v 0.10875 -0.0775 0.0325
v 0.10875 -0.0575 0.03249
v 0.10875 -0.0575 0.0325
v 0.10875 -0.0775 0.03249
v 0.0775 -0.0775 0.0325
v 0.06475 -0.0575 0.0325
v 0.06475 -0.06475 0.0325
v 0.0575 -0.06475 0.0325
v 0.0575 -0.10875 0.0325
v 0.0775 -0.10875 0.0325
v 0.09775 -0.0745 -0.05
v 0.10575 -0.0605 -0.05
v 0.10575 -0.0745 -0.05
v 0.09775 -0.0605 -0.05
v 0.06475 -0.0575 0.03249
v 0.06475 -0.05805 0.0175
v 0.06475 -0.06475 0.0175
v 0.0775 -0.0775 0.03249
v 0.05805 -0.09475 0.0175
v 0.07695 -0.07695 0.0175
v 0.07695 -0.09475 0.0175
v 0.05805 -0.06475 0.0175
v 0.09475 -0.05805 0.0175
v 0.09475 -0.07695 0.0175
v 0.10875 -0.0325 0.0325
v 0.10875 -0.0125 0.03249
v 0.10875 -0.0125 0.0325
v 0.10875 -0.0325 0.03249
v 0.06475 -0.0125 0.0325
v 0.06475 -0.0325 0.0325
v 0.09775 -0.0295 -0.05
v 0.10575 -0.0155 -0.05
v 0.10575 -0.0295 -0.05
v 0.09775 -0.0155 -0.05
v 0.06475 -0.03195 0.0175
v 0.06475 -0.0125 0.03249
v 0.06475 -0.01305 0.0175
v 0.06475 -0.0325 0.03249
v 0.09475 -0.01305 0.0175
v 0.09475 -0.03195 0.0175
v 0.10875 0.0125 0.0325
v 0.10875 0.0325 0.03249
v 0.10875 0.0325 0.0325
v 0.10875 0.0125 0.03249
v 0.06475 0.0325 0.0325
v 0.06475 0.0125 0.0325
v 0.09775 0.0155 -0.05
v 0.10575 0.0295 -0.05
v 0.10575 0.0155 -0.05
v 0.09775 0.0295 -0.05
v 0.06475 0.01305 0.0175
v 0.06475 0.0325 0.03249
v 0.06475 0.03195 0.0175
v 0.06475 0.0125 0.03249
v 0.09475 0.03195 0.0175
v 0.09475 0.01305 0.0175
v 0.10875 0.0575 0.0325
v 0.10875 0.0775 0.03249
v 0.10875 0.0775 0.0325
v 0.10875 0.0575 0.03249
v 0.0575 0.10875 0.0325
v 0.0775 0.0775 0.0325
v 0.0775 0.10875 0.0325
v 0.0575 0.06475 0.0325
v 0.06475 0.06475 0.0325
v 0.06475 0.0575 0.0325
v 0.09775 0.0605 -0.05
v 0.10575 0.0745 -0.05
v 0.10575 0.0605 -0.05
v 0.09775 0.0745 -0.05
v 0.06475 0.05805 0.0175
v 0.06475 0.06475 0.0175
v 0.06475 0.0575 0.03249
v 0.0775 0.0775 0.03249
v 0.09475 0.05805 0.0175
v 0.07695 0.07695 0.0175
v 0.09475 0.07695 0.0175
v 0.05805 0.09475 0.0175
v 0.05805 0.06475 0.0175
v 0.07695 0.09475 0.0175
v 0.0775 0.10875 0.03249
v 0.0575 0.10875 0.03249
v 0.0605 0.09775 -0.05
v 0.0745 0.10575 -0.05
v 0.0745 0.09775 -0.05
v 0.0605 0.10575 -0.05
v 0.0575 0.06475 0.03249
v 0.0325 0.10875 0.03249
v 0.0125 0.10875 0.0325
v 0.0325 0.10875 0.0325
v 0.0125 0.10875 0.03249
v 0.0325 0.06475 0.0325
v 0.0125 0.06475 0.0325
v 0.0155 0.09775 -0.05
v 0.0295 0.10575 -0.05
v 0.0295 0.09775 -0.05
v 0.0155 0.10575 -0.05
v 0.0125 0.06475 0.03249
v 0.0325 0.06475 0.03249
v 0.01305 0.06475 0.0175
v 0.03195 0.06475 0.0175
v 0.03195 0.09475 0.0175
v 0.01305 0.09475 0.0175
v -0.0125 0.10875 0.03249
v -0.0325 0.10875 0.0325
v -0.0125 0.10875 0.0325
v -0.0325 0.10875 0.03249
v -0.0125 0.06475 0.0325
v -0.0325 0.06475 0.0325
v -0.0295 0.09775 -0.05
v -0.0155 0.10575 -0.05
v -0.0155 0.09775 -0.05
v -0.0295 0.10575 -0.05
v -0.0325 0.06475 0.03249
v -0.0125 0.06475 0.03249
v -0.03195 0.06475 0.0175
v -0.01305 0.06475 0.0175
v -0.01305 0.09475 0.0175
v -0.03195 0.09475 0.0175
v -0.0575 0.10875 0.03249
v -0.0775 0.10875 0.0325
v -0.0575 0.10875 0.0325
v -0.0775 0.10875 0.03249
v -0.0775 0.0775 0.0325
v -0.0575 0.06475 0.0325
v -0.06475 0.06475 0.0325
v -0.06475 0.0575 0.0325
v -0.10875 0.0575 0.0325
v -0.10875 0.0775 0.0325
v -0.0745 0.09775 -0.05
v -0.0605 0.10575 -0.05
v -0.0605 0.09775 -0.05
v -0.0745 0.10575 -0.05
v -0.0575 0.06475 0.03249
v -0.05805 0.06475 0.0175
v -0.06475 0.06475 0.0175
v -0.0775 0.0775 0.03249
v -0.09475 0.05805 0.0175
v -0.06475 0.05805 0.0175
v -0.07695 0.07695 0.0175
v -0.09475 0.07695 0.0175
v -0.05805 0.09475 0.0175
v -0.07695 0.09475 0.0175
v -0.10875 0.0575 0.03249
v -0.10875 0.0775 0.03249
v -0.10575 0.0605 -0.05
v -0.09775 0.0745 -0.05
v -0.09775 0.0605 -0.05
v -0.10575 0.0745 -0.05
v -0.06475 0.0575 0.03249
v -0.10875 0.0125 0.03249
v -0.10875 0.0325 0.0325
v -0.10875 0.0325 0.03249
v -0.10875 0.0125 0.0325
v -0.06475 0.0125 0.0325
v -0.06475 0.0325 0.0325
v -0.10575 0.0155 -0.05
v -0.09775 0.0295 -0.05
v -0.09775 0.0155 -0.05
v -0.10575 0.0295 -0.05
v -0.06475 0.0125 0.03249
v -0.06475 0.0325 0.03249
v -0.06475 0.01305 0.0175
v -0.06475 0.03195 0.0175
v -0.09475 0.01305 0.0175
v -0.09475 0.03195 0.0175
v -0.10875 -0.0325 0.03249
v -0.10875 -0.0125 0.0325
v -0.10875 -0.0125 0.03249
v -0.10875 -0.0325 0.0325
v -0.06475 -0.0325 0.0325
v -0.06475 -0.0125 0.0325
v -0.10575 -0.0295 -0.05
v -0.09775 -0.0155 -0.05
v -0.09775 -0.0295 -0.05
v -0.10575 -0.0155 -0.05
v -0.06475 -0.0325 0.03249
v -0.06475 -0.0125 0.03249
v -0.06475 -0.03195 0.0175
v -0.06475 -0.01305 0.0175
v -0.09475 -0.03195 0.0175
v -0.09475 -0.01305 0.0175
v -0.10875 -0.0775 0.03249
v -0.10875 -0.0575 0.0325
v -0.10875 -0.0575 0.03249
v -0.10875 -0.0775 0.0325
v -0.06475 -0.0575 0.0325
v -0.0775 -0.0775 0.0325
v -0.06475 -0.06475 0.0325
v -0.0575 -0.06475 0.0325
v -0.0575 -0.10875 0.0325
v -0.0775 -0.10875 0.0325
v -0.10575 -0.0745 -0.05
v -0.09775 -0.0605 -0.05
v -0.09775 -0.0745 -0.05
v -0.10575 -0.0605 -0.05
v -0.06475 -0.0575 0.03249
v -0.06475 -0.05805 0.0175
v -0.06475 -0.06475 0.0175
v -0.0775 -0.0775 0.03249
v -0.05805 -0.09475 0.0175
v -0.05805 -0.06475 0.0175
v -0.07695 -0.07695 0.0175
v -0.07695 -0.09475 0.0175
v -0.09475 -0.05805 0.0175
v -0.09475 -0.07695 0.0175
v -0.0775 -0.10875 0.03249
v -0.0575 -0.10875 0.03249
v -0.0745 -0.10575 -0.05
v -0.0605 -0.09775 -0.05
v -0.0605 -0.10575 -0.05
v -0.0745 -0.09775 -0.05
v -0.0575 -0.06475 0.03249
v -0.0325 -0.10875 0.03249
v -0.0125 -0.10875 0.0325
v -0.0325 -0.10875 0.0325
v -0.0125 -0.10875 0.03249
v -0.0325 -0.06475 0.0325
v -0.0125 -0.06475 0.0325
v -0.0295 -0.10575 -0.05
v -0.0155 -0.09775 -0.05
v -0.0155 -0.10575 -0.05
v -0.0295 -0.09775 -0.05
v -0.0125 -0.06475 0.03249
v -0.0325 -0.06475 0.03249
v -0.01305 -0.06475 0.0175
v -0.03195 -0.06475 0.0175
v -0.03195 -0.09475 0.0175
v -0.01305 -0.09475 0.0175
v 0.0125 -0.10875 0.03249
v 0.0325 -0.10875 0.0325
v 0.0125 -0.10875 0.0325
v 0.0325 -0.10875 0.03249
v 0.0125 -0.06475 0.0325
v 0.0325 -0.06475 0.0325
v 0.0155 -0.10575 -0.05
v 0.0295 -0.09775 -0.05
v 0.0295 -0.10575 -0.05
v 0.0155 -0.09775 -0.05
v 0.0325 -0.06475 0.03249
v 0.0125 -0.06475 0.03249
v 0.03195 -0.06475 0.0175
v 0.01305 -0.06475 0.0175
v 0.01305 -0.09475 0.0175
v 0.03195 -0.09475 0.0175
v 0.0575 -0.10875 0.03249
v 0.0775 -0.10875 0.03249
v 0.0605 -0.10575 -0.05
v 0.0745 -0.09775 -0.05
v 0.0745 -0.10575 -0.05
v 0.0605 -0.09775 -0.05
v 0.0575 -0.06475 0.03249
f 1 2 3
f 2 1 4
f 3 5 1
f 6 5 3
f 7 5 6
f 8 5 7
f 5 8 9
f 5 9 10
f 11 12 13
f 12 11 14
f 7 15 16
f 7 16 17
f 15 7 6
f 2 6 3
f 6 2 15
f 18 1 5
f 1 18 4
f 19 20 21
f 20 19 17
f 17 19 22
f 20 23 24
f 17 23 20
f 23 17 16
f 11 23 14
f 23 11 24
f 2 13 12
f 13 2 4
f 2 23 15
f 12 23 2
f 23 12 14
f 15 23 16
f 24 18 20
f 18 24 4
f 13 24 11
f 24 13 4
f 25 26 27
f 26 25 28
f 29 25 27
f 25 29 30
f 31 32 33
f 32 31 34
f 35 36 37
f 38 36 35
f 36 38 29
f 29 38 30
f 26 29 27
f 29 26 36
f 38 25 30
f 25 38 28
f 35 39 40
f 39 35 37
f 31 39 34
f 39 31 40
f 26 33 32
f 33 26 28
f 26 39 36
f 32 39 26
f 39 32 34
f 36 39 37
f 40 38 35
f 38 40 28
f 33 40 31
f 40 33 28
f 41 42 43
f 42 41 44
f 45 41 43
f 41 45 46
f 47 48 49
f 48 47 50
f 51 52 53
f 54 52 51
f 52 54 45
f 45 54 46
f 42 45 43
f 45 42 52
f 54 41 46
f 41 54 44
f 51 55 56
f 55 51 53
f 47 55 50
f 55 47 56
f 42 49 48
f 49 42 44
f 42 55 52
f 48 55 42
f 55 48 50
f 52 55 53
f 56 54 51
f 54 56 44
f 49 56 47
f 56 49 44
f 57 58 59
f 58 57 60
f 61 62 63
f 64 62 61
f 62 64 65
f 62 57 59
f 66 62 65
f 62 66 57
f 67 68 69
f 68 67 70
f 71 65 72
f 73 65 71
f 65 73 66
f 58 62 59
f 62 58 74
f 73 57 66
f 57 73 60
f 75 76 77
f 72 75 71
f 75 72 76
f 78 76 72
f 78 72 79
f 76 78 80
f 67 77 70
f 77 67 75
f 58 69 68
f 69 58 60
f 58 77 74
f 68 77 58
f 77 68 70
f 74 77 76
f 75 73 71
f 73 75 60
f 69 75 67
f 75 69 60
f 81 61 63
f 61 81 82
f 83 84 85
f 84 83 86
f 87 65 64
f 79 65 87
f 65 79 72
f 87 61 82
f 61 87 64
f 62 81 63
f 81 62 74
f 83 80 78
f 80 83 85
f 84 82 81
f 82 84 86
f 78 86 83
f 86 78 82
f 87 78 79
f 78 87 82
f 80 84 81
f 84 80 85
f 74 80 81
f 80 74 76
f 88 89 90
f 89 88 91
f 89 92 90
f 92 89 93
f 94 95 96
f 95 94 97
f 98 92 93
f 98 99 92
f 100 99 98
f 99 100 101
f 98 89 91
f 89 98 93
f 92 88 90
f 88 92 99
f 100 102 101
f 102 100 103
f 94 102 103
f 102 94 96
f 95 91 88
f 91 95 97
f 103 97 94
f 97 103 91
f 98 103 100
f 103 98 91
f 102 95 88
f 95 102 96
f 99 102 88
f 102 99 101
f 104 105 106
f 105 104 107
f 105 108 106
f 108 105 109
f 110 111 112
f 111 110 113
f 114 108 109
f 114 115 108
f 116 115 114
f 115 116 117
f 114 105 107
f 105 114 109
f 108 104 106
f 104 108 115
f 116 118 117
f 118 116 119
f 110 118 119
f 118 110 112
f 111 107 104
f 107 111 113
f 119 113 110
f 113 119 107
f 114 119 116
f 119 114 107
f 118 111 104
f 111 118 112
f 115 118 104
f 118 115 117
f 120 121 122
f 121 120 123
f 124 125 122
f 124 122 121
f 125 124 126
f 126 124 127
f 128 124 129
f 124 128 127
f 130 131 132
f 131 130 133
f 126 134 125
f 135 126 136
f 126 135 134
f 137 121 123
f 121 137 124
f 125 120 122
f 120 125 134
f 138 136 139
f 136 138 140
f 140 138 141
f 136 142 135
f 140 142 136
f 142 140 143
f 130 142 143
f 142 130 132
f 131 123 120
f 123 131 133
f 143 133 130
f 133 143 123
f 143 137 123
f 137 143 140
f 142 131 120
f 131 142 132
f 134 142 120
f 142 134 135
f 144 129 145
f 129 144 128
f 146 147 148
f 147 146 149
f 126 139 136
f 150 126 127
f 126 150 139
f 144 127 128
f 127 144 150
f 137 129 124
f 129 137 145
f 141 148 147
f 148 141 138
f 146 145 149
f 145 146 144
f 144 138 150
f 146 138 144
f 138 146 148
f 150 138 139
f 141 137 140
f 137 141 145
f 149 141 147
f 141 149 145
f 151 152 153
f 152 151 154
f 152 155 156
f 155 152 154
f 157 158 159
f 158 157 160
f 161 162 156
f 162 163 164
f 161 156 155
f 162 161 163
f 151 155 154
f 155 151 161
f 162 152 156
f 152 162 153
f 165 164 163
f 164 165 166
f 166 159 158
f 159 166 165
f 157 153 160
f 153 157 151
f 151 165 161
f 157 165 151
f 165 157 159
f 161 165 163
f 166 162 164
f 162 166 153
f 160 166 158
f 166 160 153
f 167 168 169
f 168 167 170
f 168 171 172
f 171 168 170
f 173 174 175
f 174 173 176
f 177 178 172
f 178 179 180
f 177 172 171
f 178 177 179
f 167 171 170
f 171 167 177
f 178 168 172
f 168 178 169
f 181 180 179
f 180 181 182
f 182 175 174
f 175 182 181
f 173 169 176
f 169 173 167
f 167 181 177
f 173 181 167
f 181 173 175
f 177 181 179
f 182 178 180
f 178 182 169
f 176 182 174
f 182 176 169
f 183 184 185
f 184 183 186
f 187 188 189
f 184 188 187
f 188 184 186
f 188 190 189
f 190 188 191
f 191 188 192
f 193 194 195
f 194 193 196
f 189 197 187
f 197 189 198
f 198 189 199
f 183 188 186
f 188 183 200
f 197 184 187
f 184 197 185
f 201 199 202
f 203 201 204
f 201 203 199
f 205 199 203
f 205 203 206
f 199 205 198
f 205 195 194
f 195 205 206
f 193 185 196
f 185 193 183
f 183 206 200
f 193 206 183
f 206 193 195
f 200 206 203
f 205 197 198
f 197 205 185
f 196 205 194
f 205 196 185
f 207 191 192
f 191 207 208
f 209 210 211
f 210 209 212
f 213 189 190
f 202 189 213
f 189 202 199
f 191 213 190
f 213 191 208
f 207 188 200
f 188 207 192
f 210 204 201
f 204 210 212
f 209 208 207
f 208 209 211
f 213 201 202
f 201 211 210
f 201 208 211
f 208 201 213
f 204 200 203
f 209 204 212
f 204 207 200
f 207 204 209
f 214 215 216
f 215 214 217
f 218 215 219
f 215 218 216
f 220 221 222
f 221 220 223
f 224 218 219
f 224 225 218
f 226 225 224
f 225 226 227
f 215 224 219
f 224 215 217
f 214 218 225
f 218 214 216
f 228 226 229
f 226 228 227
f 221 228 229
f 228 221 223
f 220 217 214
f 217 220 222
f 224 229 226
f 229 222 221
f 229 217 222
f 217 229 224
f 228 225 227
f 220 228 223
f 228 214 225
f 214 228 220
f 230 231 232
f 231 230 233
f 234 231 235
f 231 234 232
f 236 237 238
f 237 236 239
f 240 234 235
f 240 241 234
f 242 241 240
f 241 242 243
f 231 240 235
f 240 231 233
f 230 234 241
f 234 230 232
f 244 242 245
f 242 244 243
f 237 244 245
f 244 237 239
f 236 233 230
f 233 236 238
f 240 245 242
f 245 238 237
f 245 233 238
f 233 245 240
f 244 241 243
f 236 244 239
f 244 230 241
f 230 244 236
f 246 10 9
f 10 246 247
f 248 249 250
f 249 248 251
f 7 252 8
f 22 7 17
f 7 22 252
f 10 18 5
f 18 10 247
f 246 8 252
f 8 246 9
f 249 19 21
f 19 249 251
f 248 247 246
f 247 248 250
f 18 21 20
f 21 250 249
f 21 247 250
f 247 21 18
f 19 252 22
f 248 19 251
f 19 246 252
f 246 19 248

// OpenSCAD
// file: FPGAHousing_base.scad
include <FPGA_shared.scad>;
use <FPGAHousing_paintcap.scad>;
use <PowerSymbol.scad>;
use <DataSymbol.scad>;

module FPGAHousing_chipcutout() {
  slotPinBaseOffset = (-slotPinEdgeCount-1)/2 * slotPinEdgeSpacing;
  slotPinEdgeOffset = slotSize/2 - slotPinSize/2 - slotPinEdgePad;
  union() {
    translate([0, 0, baseDepth/2 + slotBottom + slotPinDepth]) {
      cube(size=[slotSize, slotSize, baseDepth], center=true);
    }
    for(edge=[1:4]) rotate([0,0,90*edge]) {
      for(i=[1:slotPinEdgeCount]) {
        translate([
          slotPinBaseOffset + slotPinEdgeSpacing*i,
          slotPinEdgeOffset,
          slotBottom + slotPinDepth
        ]) {
          cube(size=[slotPinSize, slotPinSize, slotPinDepth*2], center=true);
        }
      }
    }
    translate([alignHoleOffset,alignHoleOffset,slotBottom + slotPinDepth])
      cylinder(h=alignHoleDepth*2, r=alignHoleRadius, center=true, $fn=alignHoleSides);
  }
}

module FPGAHousing_base() {
  middleSize = (slotSize + capSize) / 2;
  difference() {
    union() {
      translate([0,0,baseCenter])
        cube(size=[baseSize, baseSize, baseDepth], center=true);
      translate([0,0,baseTop-eps])
        cube(size=[middleSize, middleSize, capDepth*2], center=true);
    }
    translate([0,0,baseBottom])
      cube(size=[baseBackCutoutSize, baseBackCutoutSize, baseBackCutoutDepth*2], center=true);
    FPGAHousing_chipcutout();
  }
}

FPGAHousing_base();
%FPGAHousing_paintcap();
// file: Text_shared.scad
char_depth = 0.0001;

char_pixelsz = 0.02/5;
char_pheight = 5;
char_max_pwidth = 5;

function sum(list) = list * [for (_=list) 1];
function partialsum(list, end) = list * [for (i=[0:len(list)-1]) i < end ? 1 : 0];

module _Text_Line(a, b) {
  l = norm(b-a);
  f = l > 0 ? (b-a)/l : [1, 0];
  r = [f.y, -f.x];
  ea = -0.5*f;
  eb = (l+0.5)*f;
  sr = 0.5*r;
  sl = -sr;
  polygon([
    a+ea+sr,
    a+eb+sr,
    a+eb+sl,
    a+ea+sl,
  ]*char_pixelsz);
}

module _Text_Segments(pts, off=[0,0]) {
  for (i=[0:len(pts)-2]) {
    pa = pts[i];
    pb = pts[i+1];
    if (len(pa) == 2 && len(pb) == 2)
      _Text_Line(pts[i]+off, pts[i+1]+off);
  }
}

_Letters = [
  [[-2, -2], [-2, 2], [2, 2], [2, -2], [2, 0], [-2, 0]], // A
  [], // B
  [[2, -2], [-2, -2], [-2, 2], [2, 2]], // C
  [[2, 0.5], [2, -2], [-2, -2], [-2, 2], [0.5, 2], [], [3, 0], [0, 3]], // D
  [[2, -2], [-2, -2], [-2, 2], [2, 2], [], [-2, 0], [0, 0]], // E
  [[2, 2], [-2, 2], [-2, -2], [-2, 0], [0, 0]], // F
  [[0, 0], [2, 0], [2, -2], [-2, -2], [-2, 2], [2, 2]], // G
  [], // H
  [[0, -2], [0, 2]], // I
  [], // J
  [], // K
  [[-2, 2], [-2, -2], [2, -2]], // L
  [], // M
  [], // N
  [[-2, -2], [-2, 2], [2, 2], [2, -2], [-2, -2]], // O
  [[-2, -2], [-2, 2], [2, 2], [2, 0], [-2, 0]], // P
  [], // Q
  [[-2, -2], [-2, 2], [2, 2], [2, 0], [-2, 0], [1, -3]], // R
  [], // S
  [], // T
  [], // U
  [], // V
  [], // W
  [], // X
  [], // Y
  [], // Z
  [[-2, 2], [2, 2], [2, 0], [0, 0], [], [0, -2], [0, -2]], // ? for missing
];

function _Letter_Lookup(c) =
  let(
    ci=ord(c),
    li=ci-ord("A"),
    issp=ci==32,
    lps=li>=0&&li<26 ? _Letters[li] : [],
    lpf=len(lps)==0 ? _Letters[26] : lps
  ) issp ? [] : lpf;

function _Letter_Bounds(letter) =
  let(
    fletter = concat([[0, 0]], [for (l=letter) len(l)==2 ? l : [0,0]]),
    xs = [for (l=fletter) l.x],
    ys = [for (l=fletter) l.y]
  ) [min(xs), min(ys), max(xs), max(ys)];

module Text(letters) {
  lbounds = [for (l=letters) _Letter_Bounds(l)];
  lwidths = [for (b=lbounds) min(b.z-b.x+1, char_max_pwidth)];
  lmins = [for (b=lbounds) b.x];
  twid = sum(lwidths) + len(letters)-1;
  startoff = (1-twid)/2;
  offs = [for (i=[0:len(letters)-1]) startoff+i+partialsum(lwidths, i)];
  linear_extrude(height=char_depth) {
    for (i=[0:len(letters)-1]) if (len(letters[i]) > 0) {
      letter = letters[i];
      off = offs[i];
      left = off-lmins[i];
      wid = lwidths[i];
      intersection() {
        _Text_Segments(letter, [left, 0]);
        scale([char_pixelsz,char_pixelsz]) translate([off-0.5, -char_pheight/2])
          square(size=[wid, char_pheight]);
      }
    }
  }
}

module Text(text) {
  letters = [for (c=text) _Letter_Lookup(c)];
  lbounds = [for (l=letters) _Letter_Bounds(l)];
  lwidths = [for (b=lbounds) min(b.z-b.x+1, char_max_pwidth)];
  lmins = [for (b=lbounds) b.x];
  twid = sum(lwidths) + len(letters)-1;
  startoff = (1-twid)/2;
  offs = [for (i=[0:len(letters)-1]) startoff+i+partialsum(lwidths, i)];
  linear_extrude(height=char_depth) {
    for (i=[0:len(letters)-1]) if (len(letters[i]) > 0) {
      letter = letters[i];
      off = offs[i];
      left = off-lmins[i];
      wid = lwidths[i];
      intersection() {
        _Text_Segments(letter, [left, 0]);
        scale([char_pixelsz,char_pixelsz]) translate([off-0.5, -char_pheight/2])
          square(size=[wid, char_pheight]);
      }
    }
  }
}
// file: Text_FPGALOGIC.scad
include <Text_shared.scad>;

module Text_FPGALOGIC() {
  Text("FPGA LOGIC");
}

Text_FPGALOGIC();
// file: DataSymbol.scad
boxSize = 0.029;
lineSize = 0.0045;
symDepth = 0.01;
vertSeparation = 0.019;
horizSeparation = 0.018;

module DataSymbol() {
  boxVertCenter = (boxSize+vertSeparation)/2;
  boxHorizCenter = (boxSize+horizSeparation)/2;
  linear_extrude(symDepth, center=true) {
    translate([0,boxVertCenter]) square(boxSize, center=true); // top box
    translate([-boxHorizCenter,-boxVertCenter]) square(boxSize, center=true); // bottom left box
    translate([boxHorizCenter,-boxVertCenter]) square(boxSize, center=true); // bottom right box
    square([2*boxHorizCenter + lineSize, lineSize], center=true); // middle line
    translate([0, horizSeparation/4]) square([lineSize, horizSeparation/2 + lineSize], center=true); // line to top
    translate([-boxHorizCenter, -horizSeparation/4]) square([lineSize, horizSeparation/2 + lineSize], center=true); // line to bottom left
    translate([boxHorizCenter, -horizSeparation/4]) square([lineSize, horizSeparation/2 + lineSize], center=true); // line to bottom right
  }
}

DataSymbol();
// file: PowerSymbol.scad
symWidth = 0.038;
symHeight = 0.086;
symDepth = 0.01;
middleHeight = 0.0075;
topHorizOffset = 0.007;
sideVertOffset = 0.007;

module PowerSymbol() {
  linear_extrude(symDepth, center=true) {
    halfHei = symHeight/2;
    halfWid = symWidth/2;
    halfMid = middleHeight/2;
    polygon([
      [topHorizOffset, halfHei],
      [0, halfMid],
      [halfWid, sideVertOffset],
      [-topHorizOffset, -halfHei],
      [0, -halfMid],
      [-halfWid, -sideVertOffset]
    ]);
  }
}

PowerSymbol();
// file: FPGAHousing_pins.scad
include <FPGA_shared.scad>;
use <FPGAHousing_base.scad>;
use <FPGAHousing_paintcap.scad>;

module FPGAHousing_pins() {
  pinStartOffset = -(decoPinCount+1)/2 * decoPinSpacing;
  bevelSize = decoPinBevelSize * sqrt(2);

  for (edge=[0:3]) rotate([0,0,90*edge]) {
    for (pin=[1:decoPinCount]) translate([capSize/2, pinStartOffset+pin*decoPinSpacing, baseTop]) {
      difference() {
        cube(size=[decoPinLength*2, decoPinWidth, decoPinHeight*2], center=true);
        translate([decoPinLength,0,decoPinHeight]) rotate([0,45,0]) {
          cube(size=[bevelSize,decoPinWidth*2,bevelSize],center=true);
        }
      }
    }
  }
}

FPGAHousing_pins();
%FPGAHousing_base();
%FPGAHousing_paintcap();
// file: FPGAHousing_paintcap.scad
include <FPGA_shared.scad>;
use <FPGAHousing_base.scad>;

module FPGAHousing_paintcap() {
  bevelDepth = capBevel * sqrt(2);
  difference() {
    translate([0,0,baseTop]) {
      cube(size=[capSize, capSize, capDepth*2], center=true);
    }
    cube(size=[slotSize+eps*10, slotSize+eps*10, smallGridSize], center=true);
    for (edge=[1:4]) rotate([0,0,90*edge]) {
      translate([0,capSize/2,baseTop+capDepth]) rotate([45,0,0])
        cube(size=[capSize+0.1, bevelDepth, bevelDepth*2], center=true);
    }
  }
}

%FPGAHousing_base();
FPGAHousing_paintcap();
// file: FPGAHousing_logicbase.scad
include <FPGA_shared.scad>;
use <FPGAHousing_base.scad>;
use <FPGAHousing_paintcap.scad>;
use <PowerSymbol.scad>;
use <DataSymbol.scad>;

module FPGAHousing_logicbase() {
  difference() {
    FPGAHousing_base();
    cablecutout();
    rotate([0,0,180]) cablecutout();
  }
}

FPGAHousing_logicbase();
%FPGAHousing_paintcap();
%translate([0.067,0.25,-0.001]) rotate([-90, 0, 0]) PowerSymbol();
%translate([0.073,-0.25,0.001]) rotate([90, 0, 0]) DataSymbol();
// file: Text_FPGA.scad
include <Text_shared.scad>;

module Text_FPGA() {
  Text("FPGA");
}

Text_FPGA();
// file: FPGAHousing_logicfull.scad
use <FPGAHousing_logicbase.scad>;
use <FPGAHousing_paintcap.scad>;
use <FPGAHousing_pins.scad>;
use <PowerSymbol.scad>;
use <DataSymbol.scad>;
use <Text_FPGALOGIC.scad>;

module FPGAHousing_logicfull() {
  color("#444") FPGAHousing_logicbase();
  color("#444") FPGAHousing_paintcap();
  color("#FFF") FPGAHousing_pins();
  color("#F00") translate([0.067,0.25,-0.001]) rotate([-90, 0, 0]) PowerSymbol();
  color("#0F0") translate([0.073,-0.25,0.001]) rotate([90, 0, 0]) DataSymbol();
  color("#FFF") translate([0,0.16,0.095]) Text_FPGALOGIC();
}

FPGAHousing_logicfull();
// file: FPGAChip_base.scad
include <FPGA_shared.scad>;
use <FPGAHousing_logicfull.scad>;
use <FPGAChip_pins.scad>;
use <Text_FPGA.scad>;

module FPGAChip_base() {
  bevelHeight = (chipBaseHeight - pinHorizHeight)/2;
  bevelAngle = atan2(chipBaseBevelSize, bevelHeight);
  translate([0, 0, chipTotalHeight/2 - chipBaseHeight/2]) difference() {
    cube(size=[chipBaseSize, chipBaseSize, chipBaseHeight], center=true);
    for (side=[0:3]) rotate([0,0,90*side])
      for (vside = [-1:2:1])
        translate([0,chipBaseSize/2,vside*pinHorizHeight/2])
          rotate([vside*bevelAngle,0,0])
          translate([0,chipBaseBevelSize,0])
            cube(size=[chipBaseSize*2,chipBaseBevelSize*2,bevelHeight*4], center=true);
    translate([alignHoleOffset,alignHoleOffset,chipBaseHeight/2])
      cylinder(h=alignHoleDepth*2, r=alignHoleRadius, center=true, $fn=alignHoleSides);
  }
}

FPGAChip_base();
%FPGAChip_pins();
%translate([0,0,0.05]) Text_FPGA();
*%translate([0,0,-slotBottom-chipTotalHeight/2]) FPGAHousing_logicfull();
// file: FPGA_shared.scad
smallGridSize = 0.5;
baseSize = smallGridSize;
baseTop = 0.05;
baseBottom = -0.045;
baseDepth = baseTop - baseBottom;
baseCenter = (baseTop + baseBottom)/2;
baseBackRim = 0.02;
baseBackCutoutSize = baseSize - baseBackRim*2;
baseBackCutoutDepth = 0.01;
capSize = 0.41;
capDepth = 0.045;
capBevel = 0.01;
slotSize = smallGridSize * 0.5;
slotBottom = 0.03;
slotPinEdgeCount = 4;
slotPinEdgePad = 0.01;
slotPinEdgeSpacing = 0.045;
slotPinSize = 0.025;
slotPinDepth = 0.025;
eps = 0.00001;
chipTotalSize = slotSize - slotPinEdgePad*2 - slotPinSize/2;
chipTotalHeight = 0.1;
chipBaseHeight = 0.05;
pinHorizLength = 0.022;
pinHorizUnderLength = 0.008;
pinHorizWidth = 0.02;
pinHorizHeight = 0.015;
pinVertInnerOffset = 0.003;
pinVertOuterOffset = 0.003;
pinVertNarrowOffset = 0.003;
pinTotalHeight = chipTotalHeight - chipBaseHeight/2 + pinHorizHeight/2;
chipBaseSize = chipTotalSize - pinHorizLength*2;
chipBaseBevelSize = 0.005;
alignHoleRadius = 0.005;
alignHoleOffset = chipBaseSize/2 - 0.02;
alignHoleDepth = 0.005;
alignHoleSides = 8;
decoPinCount = 8;
decoPinWidth = 0.036;
decoPinLength = 0.034;
decoPinHeight = 0.028;
decoPinSpacing = 0.049;
decoPinBevelSize = 0.010;

module cablecutout() {
  cableradius = 0.025;
  cableDepth = 0.0125;
  translate([0,smallGridSize/2,0]) rotate([90,0,0]) {
    cylinder(h=cableDepth*2, r=cableradius, center=true, $fn=8);
  }
}
// main file
include <FPGA_shared.scad>;
use <FPGAChip_base.scad>;

module FPGAPin() {
  pinTop = chipTotalHeight/2 - chipBaseHeight/2 + pinHorizHeight/2;
  pinVCenter = pinTop - pinTotalHeight/2;
  pinBottomInnerEdge = pinHorizUnderLength + pinVertInnerOffset;
  pinInnerHeight = pinTotalHeight - pinHorizHeight;
  pinInnerAngle = atan2(-pinVertInnerOffset, pinInnerHeight);
  pinInnerCutoutHeight = pinInnerHeight / cos(pinInnerAngle);
  pinBottomOuterEdge = pinHorizLength - pinVertOuterOffset;
  pinOuterAngle = atan2(pinVertOuterOffset, pinTotalHeight);
  pinBottomNarrowEdge = pinHorizWidth/2 - pinVertNarrowOffset;
  pinNarrowAngle = atan2(pinVertNarrowOffset, pinTotalHeight);
  translate([0,0,pinVCenter]) difference() {
    translate([0, 0, 0])
      cube(size=[pinHorizLength*2, pinHorizWidth, pinTotalHeight], center=true);
    translate([pinHorizUnderLength-pinHorizLength, 0, -pinHorizHeight])
      cube(size=[pinHorizLength*2, pinHorizWidth*2, pinTotalHeight], center=true);
    translate([pinBottomInnerEdge,0,-pinHorizHeight/2-pinInnerHeight/2])
      rotate([0,pinInnerAngle,0])
      translate([-pinVertInnerOffset,0,0])
        cube(size=[pinVertInnerOffset*2, pinHorizWidth*2, pinInnerCutoutHeight*2], center=true);
    translate([pinBottomOuterEdge,0,-pinTotalHeight/2])
      rotate([0,pinOuterAngle,0])
      translate([pinVertOuterOffset,0,0])
        cube(size=[pinVertOuterOffset*2, pinHorizWidth*2, pinTotalHeight*4], center=true);
    translate([0,pinBottomNarrowEdge,-pinTotalHeight/2])
      rotate([-pinNarrowAngle,0,0])
      translate([0,pinVertNarrowOffset,0])
        cube(size=[pinHorizLength*4,pinVertNarrowOffset*2, pinTotalHeight*4], center=true);
    translate([0,-pinBottomNarrowEdge,-pinTotalHeight/2])
      rotate([pinNarrowAngle,0,0])
      translate([0,-pinVertNarrowOffset,0])
        cube(size=[pinHorizLength*4,pinVertNarrowOffset*2, pinTotalHeight*4], center=true);
  }
}

module FPGAChip_pins() {
  for (edge=[0:3])
    for (off=[1:slotPinEdgeCount])
      rotate([0,0,90*edge])
        translate([chipBaseSize/2, slotPinEdgeSpacing * (off - (slotPinEdgeCount+1)/2), 0])
        FPGAPin();
}

FPGAChip_pins();
%FPGAChip_base();
